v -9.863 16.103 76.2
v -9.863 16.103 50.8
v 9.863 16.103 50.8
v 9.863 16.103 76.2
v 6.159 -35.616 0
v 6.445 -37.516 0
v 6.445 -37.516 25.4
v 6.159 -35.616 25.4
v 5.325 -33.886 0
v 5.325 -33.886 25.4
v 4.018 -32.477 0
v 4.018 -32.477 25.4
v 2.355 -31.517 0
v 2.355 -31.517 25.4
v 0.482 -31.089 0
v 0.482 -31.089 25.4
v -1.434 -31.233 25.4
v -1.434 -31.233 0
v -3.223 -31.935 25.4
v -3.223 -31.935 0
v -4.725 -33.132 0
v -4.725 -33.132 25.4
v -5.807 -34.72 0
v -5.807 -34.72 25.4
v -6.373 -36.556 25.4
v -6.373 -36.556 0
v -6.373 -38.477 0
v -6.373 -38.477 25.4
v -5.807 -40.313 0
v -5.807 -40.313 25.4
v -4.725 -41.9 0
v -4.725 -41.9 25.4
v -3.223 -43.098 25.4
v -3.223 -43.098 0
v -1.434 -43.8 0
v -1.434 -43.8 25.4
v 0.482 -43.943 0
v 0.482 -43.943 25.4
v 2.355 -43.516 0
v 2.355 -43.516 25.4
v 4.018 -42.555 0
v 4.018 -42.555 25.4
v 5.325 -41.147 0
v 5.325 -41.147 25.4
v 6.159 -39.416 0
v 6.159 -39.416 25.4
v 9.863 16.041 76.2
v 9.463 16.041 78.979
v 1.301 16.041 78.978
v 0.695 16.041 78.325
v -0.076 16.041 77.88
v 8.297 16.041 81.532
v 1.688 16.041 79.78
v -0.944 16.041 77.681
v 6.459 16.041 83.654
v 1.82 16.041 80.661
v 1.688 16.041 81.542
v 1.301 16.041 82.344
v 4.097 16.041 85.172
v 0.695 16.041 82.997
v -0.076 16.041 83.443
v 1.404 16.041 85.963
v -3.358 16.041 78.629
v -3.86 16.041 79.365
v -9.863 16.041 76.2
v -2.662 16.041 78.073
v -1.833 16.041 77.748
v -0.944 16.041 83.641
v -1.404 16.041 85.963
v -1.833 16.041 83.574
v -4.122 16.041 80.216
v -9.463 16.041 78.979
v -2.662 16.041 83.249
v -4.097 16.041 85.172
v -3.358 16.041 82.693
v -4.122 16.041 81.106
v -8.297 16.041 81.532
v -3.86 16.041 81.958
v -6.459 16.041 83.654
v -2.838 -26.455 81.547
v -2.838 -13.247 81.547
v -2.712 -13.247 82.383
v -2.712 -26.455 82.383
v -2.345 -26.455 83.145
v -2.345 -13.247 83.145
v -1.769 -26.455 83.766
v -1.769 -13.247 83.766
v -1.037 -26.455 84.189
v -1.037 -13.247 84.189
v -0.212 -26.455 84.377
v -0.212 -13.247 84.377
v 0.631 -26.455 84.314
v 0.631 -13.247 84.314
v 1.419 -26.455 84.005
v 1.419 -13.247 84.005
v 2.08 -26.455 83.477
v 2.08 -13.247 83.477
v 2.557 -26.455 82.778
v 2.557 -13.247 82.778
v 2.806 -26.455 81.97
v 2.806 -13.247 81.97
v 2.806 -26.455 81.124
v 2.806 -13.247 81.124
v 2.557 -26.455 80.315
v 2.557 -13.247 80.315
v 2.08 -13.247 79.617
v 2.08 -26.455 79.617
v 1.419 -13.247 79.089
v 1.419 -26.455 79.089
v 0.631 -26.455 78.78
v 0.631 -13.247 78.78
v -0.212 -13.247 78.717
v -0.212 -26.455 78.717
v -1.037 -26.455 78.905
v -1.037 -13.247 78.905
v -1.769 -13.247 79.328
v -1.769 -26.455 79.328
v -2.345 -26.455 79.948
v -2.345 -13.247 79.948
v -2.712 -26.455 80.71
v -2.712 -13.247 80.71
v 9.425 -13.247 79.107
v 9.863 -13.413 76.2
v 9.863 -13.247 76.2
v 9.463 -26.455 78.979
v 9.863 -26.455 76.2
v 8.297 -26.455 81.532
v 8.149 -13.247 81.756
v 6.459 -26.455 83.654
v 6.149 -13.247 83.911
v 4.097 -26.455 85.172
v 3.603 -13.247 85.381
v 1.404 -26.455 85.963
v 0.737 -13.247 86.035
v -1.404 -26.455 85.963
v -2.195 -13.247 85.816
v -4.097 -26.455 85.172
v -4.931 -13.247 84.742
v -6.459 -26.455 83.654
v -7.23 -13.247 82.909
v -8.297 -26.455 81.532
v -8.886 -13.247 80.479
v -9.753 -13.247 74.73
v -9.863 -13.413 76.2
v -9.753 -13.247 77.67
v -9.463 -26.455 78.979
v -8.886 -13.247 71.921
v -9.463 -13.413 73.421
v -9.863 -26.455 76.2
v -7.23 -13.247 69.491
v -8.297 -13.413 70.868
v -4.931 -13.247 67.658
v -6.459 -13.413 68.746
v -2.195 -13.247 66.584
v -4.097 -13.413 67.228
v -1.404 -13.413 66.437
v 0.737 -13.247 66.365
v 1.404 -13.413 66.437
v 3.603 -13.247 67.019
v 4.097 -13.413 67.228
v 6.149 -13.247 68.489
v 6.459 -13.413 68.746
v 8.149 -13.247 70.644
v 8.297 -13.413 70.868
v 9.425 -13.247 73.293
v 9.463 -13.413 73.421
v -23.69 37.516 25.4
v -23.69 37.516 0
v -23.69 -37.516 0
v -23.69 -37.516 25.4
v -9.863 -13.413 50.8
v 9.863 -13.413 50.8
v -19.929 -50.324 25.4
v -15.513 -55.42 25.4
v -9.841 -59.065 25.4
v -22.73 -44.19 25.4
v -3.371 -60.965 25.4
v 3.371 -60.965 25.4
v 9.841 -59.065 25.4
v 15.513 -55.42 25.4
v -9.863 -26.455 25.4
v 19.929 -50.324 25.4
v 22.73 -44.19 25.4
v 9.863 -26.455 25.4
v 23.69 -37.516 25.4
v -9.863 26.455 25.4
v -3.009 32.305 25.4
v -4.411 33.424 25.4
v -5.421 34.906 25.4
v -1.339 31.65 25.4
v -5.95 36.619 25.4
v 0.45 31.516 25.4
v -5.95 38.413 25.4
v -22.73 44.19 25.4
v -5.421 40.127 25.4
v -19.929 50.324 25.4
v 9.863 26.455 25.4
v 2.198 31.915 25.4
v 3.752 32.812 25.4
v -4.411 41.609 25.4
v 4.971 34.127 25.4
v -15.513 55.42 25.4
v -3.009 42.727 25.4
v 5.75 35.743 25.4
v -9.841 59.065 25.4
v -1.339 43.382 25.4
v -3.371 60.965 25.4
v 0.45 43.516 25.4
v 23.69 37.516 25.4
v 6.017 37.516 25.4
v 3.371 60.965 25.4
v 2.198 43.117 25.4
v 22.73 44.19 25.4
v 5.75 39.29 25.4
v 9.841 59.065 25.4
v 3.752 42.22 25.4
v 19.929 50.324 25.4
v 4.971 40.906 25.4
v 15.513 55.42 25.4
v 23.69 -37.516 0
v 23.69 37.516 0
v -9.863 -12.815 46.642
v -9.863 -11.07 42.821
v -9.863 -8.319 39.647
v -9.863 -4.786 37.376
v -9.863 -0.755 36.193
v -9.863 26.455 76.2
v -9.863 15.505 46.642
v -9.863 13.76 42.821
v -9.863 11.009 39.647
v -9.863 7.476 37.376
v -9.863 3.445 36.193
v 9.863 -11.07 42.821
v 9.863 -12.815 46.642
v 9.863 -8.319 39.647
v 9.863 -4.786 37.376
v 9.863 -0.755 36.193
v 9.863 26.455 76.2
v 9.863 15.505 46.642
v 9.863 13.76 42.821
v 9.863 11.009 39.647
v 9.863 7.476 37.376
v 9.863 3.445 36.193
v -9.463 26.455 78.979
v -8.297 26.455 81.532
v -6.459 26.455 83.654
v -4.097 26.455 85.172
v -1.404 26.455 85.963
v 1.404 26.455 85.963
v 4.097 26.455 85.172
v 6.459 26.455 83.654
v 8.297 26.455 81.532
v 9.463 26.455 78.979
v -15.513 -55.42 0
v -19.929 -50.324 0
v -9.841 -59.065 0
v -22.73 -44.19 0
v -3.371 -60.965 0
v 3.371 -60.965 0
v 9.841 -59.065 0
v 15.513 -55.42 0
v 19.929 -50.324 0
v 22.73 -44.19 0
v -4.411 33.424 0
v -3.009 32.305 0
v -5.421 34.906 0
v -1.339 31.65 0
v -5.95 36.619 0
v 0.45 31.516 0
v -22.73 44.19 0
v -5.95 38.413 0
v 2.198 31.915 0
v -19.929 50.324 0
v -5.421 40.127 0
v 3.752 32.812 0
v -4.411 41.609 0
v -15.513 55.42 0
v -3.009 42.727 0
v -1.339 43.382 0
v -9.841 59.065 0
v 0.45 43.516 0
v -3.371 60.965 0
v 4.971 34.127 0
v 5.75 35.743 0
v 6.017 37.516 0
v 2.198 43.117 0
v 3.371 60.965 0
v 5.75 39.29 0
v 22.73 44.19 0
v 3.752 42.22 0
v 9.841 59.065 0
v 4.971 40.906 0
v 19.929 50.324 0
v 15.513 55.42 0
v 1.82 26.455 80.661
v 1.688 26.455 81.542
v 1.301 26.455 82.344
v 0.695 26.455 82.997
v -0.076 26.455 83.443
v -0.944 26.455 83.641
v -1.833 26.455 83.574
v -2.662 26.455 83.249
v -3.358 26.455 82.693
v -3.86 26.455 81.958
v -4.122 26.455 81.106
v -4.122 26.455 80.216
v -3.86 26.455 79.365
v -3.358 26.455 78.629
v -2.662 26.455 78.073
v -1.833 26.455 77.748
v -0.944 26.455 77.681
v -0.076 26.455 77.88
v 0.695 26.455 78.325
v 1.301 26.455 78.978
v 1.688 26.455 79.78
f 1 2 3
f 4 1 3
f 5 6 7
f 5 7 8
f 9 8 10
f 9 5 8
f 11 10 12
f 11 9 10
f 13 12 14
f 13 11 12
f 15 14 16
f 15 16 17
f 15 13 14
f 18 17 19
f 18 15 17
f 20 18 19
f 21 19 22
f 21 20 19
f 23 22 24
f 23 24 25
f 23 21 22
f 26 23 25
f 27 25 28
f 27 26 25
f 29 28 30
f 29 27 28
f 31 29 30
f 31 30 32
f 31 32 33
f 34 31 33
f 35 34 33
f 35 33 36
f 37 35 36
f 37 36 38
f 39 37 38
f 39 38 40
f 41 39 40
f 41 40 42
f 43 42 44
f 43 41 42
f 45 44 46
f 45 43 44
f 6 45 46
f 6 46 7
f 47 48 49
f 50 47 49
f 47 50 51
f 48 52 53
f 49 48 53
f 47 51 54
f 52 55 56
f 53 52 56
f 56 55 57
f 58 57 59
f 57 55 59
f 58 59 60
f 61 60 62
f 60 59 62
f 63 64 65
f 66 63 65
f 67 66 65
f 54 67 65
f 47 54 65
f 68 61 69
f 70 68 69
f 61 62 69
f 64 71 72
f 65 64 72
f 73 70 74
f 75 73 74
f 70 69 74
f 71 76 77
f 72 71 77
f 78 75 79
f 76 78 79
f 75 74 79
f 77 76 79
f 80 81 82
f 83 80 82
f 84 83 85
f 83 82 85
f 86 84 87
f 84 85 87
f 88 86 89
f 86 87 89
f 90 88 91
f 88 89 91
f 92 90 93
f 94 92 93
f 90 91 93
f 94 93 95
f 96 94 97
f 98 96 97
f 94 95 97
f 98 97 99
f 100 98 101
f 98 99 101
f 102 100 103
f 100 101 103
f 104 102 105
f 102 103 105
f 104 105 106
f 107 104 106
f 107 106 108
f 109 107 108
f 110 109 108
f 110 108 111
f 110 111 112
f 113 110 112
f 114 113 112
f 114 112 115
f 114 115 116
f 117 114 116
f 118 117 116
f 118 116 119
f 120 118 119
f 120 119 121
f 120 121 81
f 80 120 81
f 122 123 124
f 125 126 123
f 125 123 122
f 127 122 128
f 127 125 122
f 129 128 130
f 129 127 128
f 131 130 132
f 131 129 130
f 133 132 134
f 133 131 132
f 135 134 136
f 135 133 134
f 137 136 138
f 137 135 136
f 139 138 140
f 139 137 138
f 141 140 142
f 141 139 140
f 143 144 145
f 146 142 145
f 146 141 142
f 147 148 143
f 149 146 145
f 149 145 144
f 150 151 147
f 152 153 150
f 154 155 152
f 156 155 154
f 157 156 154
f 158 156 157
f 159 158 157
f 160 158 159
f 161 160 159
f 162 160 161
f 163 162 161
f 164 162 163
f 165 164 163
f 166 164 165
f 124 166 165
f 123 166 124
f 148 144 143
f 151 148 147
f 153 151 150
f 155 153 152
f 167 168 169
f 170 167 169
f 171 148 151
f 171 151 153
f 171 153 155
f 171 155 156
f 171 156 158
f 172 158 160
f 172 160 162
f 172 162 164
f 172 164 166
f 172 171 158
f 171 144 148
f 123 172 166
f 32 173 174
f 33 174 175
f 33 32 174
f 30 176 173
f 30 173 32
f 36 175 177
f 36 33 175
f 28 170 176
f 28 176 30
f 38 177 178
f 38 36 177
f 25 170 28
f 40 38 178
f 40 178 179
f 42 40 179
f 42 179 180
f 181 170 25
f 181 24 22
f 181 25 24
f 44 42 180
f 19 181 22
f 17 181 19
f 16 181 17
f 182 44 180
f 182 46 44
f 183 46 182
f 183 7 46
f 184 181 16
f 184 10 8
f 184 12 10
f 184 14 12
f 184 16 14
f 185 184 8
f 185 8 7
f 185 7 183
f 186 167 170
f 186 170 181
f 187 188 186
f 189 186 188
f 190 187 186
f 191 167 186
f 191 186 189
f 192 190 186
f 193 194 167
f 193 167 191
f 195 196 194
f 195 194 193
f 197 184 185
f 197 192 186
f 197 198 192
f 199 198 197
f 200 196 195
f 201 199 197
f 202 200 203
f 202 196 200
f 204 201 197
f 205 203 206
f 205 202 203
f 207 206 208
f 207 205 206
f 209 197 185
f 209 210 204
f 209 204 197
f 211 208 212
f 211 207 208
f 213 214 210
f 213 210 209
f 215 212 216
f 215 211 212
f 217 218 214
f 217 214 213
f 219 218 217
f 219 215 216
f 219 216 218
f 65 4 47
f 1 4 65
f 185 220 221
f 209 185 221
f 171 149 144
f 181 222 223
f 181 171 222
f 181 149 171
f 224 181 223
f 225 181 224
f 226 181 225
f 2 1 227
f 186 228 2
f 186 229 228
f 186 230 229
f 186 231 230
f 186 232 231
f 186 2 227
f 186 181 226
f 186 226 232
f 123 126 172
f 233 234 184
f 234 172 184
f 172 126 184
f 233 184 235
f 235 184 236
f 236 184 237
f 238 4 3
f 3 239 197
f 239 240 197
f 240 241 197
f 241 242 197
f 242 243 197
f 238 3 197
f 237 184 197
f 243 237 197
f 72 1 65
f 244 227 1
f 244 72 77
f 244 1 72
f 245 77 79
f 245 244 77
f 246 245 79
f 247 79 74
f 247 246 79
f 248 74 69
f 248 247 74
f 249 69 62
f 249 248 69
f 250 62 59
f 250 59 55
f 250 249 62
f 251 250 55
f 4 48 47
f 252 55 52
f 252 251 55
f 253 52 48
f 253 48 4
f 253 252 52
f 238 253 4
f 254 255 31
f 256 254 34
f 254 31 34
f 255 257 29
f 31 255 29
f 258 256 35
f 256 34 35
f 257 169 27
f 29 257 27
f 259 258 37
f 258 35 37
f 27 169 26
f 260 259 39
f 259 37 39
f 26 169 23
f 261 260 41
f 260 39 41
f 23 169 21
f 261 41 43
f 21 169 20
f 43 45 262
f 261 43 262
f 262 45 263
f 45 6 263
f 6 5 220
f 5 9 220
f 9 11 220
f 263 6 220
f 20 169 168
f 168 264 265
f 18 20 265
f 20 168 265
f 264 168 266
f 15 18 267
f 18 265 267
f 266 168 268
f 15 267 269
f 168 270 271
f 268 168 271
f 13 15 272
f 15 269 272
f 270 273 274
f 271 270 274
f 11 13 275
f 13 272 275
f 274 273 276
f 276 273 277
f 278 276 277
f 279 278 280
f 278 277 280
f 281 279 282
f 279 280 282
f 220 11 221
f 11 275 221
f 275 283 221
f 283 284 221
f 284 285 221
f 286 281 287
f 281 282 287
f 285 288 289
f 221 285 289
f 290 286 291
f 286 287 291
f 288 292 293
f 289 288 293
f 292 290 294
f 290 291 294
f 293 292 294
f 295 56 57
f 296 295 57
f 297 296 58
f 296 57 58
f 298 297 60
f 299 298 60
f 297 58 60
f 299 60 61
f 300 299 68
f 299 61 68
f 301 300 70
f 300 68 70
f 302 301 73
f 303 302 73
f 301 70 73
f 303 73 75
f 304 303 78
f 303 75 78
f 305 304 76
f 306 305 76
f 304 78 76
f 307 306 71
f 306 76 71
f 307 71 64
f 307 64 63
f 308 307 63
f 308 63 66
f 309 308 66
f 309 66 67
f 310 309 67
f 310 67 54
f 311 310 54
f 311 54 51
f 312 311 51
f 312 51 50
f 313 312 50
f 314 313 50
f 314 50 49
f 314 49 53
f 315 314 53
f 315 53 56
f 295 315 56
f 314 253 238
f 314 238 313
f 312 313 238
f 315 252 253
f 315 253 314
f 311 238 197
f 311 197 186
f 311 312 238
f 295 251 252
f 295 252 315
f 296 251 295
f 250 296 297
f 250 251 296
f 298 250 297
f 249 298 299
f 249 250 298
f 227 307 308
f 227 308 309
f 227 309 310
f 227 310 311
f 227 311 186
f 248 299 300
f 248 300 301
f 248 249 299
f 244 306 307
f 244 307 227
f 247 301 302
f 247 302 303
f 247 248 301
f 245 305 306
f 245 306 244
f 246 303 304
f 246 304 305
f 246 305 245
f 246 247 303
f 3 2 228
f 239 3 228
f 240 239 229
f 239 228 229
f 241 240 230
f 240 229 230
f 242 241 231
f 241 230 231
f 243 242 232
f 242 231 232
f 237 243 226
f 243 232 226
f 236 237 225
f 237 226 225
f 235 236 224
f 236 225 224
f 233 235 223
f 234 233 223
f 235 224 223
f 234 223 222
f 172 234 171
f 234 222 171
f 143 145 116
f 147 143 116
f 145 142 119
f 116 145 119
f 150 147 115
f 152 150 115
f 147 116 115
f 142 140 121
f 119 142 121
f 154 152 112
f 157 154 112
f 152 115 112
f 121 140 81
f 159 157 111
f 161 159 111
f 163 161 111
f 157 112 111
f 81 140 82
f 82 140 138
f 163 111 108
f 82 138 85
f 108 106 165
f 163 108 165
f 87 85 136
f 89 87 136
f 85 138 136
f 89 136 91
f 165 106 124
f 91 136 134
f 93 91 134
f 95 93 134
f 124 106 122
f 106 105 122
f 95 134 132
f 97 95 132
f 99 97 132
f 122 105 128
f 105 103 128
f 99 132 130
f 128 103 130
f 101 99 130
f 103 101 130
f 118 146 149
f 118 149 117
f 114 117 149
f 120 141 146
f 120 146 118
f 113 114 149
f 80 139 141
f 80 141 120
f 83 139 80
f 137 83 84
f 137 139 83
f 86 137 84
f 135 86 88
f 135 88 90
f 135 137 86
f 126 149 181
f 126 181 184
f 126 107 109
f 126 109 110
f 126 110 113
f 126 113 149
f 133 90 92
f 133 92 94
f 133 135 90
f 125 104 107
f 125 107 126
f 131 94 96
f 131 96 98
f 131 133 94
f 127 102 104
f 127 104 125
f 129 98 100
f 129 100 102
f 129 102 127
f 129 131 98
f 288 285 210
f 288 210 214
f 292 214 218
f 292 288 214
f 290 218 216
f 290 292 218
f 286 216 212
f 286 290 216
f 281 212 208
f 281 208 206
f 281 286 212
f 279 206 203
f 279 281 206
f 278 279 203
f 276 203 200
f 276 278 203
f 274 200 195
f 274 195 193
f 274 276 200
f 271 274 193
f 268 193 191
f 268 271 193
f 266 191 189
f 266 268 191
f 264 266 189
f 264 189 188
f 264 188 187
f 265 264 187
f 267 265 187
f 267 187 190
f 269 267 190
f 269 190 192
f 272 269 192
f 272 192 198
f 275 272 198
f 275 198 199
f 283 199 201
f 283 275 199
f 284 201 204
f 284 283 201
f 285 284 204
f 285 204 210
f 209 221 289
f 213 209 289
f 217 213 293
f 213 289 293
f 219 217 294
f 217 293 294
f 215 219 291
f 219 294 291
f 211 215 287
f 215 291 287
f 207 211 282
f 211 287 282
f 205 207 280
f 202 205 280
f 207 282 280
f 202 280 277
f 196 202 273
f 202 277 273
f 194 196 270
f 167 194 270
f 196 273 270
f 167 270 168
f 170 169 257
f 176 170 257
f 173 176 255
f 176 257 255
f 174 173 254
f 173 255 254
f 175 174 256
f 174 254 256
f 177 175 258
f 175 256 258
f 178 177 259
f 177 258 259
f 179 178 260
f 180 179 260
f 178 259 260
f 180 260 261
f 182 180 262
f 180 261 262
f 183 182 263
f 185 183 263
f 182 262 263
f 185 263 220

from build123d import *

# Parameters (mm, degrees)
F0_R      = 6.445170834
F0_R_2    = 6.017003406
F1_DEPTH  = 25.4
F2_W      = 19.7259690613
F2_H      = 52.9098398983
F3_DEPTH  = 25.4
F5_W      = 19.7259690613
F5_H      = 13.0423298106
F6_DEPTH  = 25.4
F4_W      = 19.7259690613
F4_H      = 10.3523302823
F7_DEPTH  = 25.4
F8_R      = 9.8629845306
F9_DEPTH  = 13.208
F12_DEPTH = 10.414
F13_R     = 2.9880803611
F14_DEPTH = 25.4
F15_R     = 2.8379061559
F16_DEPTH = 25.4
F18_DEPTH = 50.8


with BuildPart() as f1:
    # F0 (on Top) → F1 (new body)
    with BuildSketch(Plane.XY):
        with BuildLine():
            Line((23.6895978451, -37.5162102282), (23.6895978451, 37.5162102282))
            ThreePointArc((23.6895978451, 37.5162102282), (0, 61.2058080733), (-23.6895978451, 37.5162102282))
            Line((-23.6895978451, 37.5162102282), (-23.6895978451, -37.5162102282))
            ThreePointArc((-23.6895978451, -37.5162102282), (0, -61.2058080733), (23.6895978451, -37.5162102282))
        make_face()
        with Locations((0, -37.5162102282)):
            Circle(F0_R, mode=Mode.SUBTRACT)
        with Locations((0, 37.5162102282)):
            Circle(F0_R_2, mode=Mode.SUBTRACT)
    extrude(amount=F1_DEPTH)

    # F2 (on face) → F3 (join)
    with BuildSketch(Plane.XY.offset(25.4)):
        Rectangle(F2_W, F2_H)
    extrude(amount=F3_DEPTH)

    # F5 (on face) → F6 (join)
    with BuildSketch(Plane.XY.offset(50.8)):
        with Locations((0, -19.9337550439)):
            Rectangle(F5_W, F5_H)
    extrude(amount=F6_DEPTH)

    # F4 (on face) → F7 (join)
    with BuildSketch(Plane.XY.offset(50.8)):
        with Locations((0, 21.278754808)):
            Rectangle(F4_W, F4_H)
    extrude(amount=F7_DEPTH)

    # F8 (on face) → F9 (join)
    with BuildSketch(Plane.XZ.offset(26.4549199492)):
        with Locations((0, 76.2)):
            Circle(F8_R)
    extrude(amount=-F9_DEPTH)

    # F11 (on face) → F12 (join)
    with BuildSketch(Plane(origin=(0, 26.4549199492, 0), x_dir=(-1, 0, 0), z_dir=(0, 1, 0))):
        with BuildLine():
            Line((-9.8629845306, 76.2), (9.8629845306, 76.2))
            ThreePointArc((9.8629845306, 76.2), (0, 86.0629845306), (-9.8629845306, 76.2))
        make_face()
    extrude(amount=-F12_DEPTH)

    # F13 (on face) → F14 (cut)
    with BuildSketch(Plane.XZ.offset(-16.0409199492)):
        with Locations((-1.1676928261, 80.6610658765)):
            Circle(F13_R)
    extrude(amount=-F14_DEPTH, mode=Mode.SUBTRACT)

    # F15 (on face) → F16 (cut)
    with BuildSketch(Plane(origin=(0, -13.2469199492, 0), x_dir=(-1, 0, 0), z_dir=(0, 1, 0))):
        with Locations((0, 81.546805799)):
            Circle(F15_R)
    extrude(amount=-F16_DEPTH, mode=Mode.SUBTRACT)

    # F17 (on face) → F18 (cut)
    with BuildSketch(Plane(origin=(-9.8629845306, 0, 0), x_dir=(0, -1, 0), z_dir=(-1, 0, 0))):
        with BuildLine():
            ThreePointArc((-16.1025896668, 50.8), (-1.3449997641, 36.0424100973), (13.4125901386, 50.8))
            Line((13.4125901386, 50.8), (-16.1025896668, 50.8))
        make_face()
    extrude(amount=-F18_DEPTH, mode=Mode.SUBTRACT)


solid = f1.part
